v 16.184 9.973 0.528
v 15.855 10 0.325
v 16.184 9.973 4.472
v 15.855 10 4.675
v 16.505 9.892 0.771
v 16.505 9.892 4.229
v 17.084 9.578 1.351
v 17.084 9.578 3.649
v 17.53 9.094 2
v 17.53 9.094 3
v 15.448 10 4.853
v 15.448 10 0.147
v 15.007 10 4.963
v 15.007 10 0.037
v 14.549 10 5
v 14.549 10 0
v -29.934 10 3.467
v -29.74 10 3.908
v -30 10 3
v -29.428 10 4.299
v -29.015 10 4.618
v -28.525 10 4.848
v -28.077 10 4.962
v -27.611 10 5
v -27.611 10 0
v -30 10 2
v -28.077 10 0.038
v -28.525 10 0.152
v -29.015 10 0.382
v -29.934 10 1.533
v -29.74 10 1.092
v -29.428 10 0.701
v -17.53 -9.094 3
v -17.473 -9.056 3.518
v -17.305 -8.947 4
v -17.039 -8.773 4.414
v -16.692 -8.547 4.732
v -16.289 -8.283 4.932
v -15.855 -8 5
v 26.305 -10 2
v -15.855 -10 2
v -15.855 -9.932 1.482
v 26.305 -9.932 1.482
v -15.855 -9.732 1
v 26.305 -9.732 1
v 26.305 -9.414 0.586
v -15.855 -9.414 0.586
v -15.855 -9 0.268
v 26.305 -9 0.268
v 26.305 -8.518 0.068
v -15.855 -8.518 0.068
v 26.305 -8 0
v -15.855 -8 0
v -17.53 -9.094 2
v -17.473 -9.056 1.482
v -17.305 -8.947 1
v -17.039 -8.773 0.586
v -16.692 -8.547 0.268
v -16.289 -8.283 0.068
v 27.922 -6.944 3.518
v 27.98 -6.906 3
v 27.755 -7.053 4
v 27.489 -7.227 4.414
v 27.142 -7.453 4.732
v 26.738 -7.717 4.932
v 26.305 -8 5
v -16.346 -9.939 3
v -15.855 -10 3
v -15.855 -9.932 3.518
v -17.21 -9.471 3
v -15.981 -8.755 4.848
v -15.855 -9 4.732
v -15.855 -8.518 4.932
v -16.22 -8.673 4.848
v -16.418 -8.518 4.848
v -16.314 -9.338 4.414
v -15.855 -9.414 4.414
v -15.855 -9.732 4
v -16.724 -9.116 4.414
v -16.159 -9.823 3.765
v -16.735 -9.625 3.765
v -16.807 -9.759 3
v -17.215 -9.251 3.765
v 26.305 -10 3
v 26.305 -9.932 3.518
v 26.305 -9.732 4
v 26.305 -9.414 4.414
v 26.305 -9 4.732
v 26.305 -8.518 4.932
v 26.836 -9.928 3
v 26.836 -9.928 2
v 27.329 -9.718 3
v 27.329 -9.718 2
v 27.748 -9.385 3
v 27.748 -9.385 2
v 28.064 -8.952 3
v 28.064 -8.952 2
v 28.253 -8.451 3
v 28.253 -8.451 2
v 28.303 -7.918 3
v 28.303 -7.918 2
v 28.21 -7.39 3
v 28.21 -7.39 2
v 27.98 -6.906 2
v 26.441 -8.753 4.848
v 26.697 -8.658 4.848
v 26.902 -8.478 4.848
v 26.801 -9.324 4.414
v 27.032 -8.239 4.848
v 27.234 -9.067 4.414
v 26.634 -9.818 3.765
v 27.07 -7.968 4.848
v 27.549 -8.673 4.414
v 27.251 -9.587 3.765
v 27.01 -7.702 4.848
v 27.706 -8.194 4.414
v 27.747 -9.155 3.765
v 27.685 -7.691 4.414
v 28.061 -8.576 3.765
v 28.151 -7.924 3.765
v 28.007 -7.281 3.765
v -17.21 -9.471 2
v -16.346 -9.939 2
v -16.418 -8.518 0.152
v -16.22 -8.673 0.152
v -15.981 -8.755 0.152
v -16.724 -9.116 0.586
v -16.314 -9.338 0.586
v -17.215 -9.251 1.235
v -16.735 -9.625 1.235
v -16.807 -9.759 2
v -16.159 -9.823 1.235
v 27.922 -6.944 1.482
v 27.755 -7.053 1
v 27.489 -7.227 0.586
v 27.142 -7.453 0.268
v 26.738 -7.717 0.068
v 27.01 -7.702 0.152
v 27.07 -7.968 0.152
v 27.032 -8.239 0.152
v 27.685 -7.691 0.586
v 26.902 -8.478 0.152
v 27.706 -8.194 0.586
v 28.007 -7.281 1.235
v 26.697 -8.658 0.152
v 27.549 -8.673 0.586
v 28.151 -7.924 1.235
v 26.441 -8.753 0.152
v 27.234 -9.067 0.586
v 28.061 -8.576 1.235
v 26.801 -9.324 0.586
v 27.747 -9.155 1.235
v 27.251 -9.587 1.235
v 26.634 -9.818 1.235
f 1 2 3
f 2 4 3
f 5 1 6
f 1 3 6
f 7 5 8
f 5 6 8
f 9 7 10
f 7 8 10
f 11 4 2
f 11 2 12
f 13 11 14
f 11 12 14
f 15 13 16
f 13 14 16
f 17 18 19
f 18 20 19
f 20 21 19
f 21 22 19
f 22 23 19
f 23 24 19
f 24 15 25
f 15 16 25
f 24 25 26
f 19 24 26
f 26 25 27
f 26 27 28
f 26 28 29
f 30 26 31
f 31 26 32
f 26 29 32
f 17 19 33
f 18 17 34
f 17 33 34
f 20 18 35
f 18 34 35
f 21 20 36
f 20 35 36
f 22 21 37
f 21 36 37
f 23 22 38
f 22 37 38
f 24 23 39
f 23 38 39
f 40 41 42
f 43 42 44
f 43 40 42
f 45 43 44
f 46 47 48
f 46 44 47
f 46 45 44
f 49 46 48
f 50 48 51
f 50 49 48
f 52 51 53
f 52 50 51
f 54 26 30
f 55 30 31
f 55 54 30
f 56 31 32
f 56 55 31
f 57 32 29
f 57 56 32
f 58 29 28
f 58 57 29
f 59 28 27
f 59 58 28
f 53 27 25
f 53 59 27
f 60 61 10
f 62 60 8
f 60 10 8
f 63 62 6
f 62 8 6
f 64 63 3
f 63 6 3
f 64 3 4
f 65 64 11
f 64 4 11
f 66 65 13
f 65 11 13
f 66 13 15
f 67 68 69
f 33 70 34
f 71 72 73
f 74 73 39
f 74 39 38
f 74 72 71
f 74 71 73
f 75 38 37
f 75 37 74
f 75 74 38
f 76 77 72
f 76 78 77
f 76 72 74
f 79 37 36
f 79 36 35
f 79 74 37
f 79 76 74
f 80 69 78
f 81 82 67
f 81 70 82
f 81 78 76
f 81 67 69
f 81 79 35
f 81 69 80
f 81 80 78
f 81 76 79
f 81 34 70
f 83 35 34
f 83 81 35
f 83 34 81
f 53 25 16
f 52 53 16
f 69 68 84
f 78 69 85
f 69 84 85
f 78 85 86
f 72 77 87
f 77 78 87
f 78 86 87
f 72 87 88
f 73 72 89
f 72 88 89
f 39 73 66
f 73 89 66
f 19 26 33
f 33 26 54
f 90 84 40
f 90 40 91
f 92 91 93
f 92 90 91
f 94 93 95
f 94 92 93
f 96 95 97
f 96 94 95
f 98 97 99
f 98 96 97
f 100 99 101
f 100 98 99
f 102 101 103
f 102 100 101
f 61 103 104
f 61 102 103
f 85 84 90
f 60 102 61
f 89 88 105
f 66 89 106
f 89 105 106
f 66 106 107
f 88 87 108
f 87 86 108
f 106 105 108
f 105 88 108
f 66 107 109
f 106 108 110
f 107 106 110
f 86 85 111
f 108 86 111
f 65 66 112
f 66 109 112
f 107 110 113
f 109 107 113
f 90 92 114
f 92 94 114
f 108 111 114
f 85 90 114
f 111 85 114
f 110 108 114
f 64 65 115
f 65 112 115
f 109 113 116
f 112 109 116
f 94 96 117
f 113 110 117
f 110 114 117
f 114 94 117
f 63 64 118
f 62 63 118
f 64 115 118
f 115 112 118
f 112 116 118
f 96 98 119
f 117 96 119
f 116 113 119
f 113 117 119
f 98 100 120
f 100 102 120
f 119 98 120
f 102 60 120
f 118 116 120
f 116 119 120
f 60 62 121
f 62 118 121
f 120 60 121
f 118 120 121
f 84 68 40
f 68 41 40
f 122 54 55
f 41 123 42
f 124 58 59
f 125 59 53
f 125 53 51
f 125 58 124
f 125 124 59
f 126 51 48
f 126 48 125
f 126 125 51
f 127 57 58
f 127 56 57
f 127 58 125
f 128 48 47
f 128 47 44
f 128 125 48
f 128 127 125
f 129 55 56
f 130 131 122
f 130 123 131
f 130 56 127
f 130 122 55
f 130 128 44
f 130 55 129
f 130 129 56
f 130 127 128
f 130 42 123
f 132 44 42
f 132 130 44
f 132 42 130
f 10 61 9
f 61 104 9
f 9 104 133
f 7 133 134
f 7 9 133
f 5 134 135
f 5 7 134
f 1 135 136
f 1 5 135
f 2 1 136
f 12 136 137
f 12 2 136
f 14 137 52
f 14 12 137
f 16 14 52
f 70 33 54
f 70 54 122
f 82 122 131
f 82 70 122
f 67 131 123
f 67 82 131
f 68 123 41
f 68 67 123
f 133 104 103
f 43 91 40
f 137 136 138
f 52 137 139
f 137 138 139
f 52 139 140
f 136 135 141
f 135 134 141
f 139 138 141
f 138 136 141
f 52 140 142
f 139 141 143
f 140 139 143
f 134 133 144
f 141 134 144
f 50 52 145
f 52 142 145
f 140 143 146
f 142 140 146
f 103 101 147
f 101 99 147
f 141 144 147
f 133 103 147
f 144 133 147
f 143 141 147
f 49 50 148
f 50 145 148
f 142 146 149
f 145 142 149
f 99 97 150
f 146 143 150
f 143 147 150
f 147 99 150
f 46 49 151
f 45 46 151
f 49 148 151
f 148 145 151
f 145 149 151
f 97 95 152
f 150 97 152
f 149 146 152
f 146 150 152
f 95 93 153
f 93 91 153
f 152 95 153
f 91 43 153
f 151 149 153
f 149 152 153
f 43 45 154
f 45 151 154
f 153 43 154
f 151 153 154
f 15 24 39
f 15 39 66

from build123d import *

# Parameters (mm, degrees)
F1_DEPTH = 5
F2_R     = 2


with BuildPart() as f1:
    # F0 (on Top) → F1 (new body)
    with BuildSketch(Plane.XY):
        Polygon((16.937762, 10), (-30, 10), (-16.937762, -10), (30, -10), align=None)
    extrude(amount=F1_DEPTH)

    # F2
    f2_edges = [f1.edges().sort_by_distance(p)[0] for p in [
        (6.531119, -10, 5),
        (-23.468881, 0, 5),
        (-23.468881, 0, 0),
        (23.468881, 0, 5),
        (30, -10, 2.5),
        (16.937762, 10, 2.5),
        (23.468881, 0, 0),
        (6.531119, -10, 0),
        (-16.937762, -10, 2.5),
    ]]
    fillet(f2_edges, radius=F2_R)


solid = f1.part
